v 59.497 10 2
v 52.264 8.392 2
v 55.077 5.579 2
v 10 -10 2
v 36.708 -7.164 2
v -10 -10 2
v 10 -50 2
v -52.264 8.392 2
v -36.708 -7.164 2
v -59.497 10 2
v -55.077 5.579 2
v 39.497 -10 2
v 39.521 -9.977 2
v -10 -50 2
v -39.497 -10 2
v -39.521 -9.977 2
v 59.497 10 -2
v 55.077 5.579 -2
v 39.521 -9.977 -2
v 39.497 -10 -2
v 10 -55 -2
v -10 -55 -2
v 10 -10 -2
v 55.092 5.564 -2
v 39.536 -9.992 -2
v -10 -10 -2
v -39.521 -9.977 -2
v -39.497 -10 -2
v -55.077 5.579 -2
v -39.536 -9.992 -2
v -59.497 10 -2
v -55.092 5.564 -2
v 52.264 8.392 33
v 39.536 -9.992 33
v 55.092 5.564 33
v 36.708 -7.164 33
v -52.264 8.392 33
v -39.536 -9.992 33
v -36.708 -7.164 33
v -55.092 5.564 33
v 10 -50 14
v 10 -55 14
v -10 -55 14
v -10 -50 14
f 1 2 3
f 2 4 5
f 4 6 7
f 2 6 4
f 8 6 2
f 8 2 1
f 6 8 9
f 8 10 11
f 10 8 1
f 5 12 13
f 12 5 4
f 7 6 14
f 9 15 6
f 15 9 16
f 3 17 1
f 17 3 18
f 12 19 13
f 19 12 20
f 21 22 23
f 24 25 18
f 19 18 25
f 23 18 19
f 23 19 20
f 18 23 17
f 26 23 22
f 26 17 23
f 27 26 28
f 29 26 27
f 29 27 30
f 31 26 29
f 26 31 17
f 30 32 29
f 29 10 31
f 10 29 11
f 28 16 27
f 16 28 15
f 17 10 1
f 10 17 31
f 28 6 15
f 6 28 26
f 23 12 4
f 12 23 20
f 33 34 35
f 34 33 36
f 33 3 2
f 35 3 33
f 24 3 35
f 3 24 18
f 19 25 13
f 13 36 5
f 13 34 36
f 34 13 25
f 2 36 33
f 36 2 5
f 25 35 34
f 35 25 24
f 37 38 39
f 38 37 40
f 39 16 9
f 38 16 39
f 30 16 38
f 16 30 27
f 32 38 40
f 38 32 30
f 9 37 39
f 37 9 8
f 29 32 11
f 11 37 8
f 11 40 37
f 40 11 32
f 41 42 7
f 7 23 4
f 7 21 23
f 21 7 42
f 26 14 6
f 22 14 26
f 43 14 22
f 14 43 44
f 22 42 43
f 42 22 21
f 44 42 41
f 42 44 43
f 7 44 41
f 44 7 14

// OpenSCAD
thickness = 4.0;

module mainFrame(){
    cube([120,20,thickness],center=true);
}
 
 module cutter(){
    rotate([0, 0, 45]) {
        translate(v = [45, -45, 0]) {  
            cube([50, 20, thickness], center=true);
        }
    }
}

module cutters(){
    cutter();
    mirror(v= [180, 0, 0] ) {
        cutter();
    }
}

module frameCutted(){
    difference() {
        mainFrame();
        cutters();
    }
}

module holder(){
    translate(v = [45.9, -0.8, 15.5]) {  
        rotate([0, 0, 45]) {
            cube([22, thickness, 35], center=true);
        }
    }
}

module holders(){
    holder();
     mirror(v= [180, 0, 0] ) {
        holder();
    }
}

module holderBack(){
    translate(v = [0, -22.5, 0]) {
        cube([20,65,thickness],center=true);
            translate(v = [0, -30, 6]) {
                cube([20,5,thickness*4],center=true);
            }
       }
}

union (){
    frameCutted();
    holders();
    holderBack();
}
